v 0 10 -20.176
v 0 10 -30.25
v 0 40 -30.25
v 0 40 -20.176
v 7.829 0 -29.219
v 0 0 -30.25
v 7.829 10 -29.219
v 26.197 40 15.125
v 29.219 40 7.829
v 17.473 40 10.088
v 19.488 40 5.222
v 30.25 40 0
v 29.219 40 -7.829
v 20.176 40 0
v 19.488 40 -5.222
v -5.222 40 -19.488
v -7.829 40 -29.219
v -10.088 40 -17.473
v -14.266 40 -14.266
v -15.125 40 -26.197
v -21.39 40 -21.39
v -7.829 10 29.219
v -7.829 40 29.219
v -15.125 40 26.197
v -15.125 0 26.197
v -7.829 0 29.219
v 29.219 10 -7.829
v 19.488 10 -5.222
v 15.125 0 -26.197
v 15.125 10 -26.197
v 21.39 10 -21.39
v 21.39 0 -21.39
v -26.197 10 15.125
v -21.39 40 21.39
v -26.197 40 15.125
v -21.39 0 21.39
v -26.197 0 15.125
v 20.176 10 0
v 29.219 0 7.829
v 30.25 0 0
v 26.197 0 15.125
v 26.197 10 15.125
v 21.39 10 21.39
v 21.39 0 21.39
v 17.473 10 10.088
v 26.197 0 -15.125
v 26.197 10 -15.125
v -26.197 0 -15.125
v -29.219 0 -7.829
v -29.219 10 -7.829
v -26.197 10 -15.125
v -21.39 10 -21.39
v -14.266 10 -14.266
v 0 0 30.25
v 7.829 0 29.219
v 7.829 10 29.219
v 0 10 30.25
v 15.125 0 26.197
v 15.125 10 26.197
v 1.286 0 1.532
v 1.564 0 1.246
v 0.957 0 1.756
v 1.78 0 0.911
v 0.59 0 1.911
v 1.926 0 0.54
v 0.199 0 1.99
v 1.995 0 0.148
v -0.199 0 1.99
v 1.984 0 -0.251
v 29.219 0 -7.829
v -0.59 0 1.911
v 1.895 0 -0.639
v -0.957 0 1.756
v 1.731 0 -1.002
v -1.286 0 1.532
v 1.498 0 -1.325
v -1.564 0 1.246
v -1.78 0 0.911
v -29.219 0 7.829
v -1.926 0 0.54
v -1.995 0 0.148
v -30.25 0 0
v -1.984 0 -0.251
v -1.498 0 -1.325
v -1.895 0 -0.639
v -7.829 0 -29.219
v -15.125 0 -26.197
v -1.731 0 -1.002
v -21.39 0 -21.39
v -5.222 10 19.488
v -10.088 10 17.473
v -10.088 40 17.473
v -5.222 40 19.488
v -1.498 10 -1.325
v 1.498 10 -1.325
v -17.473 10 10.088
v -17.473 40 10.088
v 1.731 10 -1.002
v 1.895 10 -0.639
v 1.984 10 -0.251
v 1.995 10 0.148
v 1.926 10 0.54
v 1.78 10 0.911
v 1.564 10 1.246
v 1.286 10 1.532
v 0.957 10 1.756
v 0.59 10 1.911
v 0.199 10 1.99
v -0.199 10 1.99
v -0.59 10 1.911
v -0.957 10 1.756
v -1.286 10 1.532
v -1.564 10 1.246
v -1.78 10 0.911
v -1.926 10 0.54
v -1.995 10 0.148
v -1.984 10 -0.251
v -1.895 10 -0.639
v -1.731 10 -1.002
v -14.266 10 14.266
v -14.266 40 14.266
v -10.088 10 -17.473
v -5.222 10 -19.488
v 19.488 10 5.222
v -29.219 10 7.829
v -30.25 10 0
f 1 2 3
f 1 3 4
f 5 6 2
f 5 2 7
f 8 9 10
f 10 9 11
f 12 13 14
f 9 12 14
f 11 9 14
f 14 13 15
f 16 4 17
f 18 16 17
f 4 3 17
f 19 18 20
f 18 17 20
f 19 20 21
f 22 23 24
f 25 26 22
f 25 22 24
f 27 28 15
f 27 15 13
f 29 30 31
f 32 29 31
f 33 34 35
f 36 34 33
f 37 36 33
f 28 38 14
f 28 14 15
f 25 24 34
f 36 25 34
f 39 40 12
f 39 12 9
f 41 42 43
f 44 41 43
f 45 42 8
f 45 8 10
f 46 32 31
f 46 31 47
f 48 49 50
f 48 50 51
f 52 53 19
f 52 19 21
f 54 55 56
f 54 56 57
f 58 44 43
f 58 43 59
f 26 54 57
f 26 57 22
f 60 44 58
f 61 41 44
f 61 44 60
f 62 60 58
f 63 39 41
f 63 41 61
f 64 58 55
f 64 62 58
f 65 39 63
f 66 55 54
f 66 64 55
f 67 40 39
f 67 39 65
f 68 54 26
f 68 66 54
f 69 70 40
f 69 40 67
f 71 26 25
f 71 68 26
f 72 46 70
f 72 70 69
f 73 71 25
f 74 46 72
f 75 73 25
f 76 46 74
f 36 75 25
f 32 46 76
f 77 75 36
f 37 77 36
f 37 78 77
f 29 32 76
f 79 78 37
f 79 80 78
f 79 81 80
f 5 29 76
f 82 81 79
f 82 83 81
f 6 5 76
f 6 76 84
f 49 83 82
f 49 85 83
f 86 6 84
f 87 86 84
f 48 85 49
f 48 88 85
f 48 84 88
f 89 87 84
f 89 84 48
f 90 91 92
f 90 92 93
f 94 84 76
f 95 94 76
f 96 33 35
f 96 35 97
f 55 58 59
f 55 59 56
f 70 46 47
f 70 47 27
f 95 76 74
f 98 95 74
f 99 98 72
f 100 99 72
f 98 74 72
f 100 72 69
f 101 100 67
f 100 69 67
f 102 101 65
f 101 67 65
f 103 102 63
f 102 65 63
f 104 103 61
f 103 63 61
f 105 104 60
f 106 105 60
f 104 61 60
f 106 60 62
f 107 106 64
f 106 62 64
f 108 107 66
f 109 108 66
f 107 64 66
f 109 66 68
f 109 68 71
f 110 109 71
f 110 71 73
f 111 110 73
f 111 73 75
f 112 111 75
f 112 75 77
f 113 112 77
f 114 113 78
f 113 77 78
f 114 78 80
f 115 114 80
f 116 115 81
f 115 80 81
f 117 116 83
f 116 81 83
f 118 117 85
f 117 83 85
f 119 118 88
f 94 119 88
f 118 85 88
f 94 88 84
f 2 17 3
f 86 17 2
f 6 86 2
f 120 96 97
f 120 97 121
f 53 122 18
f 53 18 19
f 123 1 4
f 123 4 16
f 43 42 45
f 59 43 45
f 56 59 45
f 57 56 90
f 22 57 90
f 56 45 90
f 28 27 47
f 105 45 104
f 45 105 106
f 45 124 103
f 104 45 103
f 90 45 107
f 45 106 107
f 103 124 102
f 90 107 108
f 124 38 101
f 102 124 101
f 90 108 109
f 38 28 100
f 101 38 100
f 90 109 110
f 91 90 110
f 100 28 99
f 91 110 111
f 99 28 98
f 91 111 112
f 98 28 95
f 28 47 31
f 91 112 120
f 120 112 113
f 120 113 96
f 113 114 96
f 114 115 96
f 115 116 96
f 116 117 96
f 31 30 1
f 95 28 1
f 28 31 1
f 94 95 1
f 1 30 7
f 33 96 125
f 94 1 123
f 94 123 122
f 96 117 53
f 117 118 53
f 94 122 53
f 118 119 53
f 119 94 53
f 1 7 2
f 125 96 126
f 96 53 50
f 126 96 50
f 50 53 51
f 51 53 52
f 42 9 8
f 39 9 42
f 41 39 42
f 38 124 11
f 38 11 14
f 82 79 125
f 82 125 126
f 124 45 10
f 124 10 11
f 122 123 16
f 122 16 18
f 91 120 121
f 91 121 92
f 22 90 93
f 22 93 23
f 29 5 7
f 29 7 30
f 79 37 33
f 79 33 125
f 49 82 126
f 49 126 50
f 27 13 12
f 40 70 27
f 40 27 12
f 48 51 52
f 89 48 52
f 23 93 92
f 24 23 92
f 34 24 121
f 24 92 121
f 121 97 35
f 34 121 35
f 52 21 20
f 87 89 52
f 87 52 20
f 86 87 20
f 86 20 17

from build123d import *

# Parameters (mm, degrees)
BOSS_EXTRUDE2_DEPTH = 10
BOSS_EXTRUDE3_DEPTH = 40
BOSS_EXTRUDE4_DEPTH = 10


with BuildPart() as part:
    # Sketch1 → Boss-Extrude2 (new body)
    with BuildSketch(Plane(origin=(0, 0, 0), x_dir=(1, 0, 0), z_dir=(0, 1, 0))):
        Polygon((-10.087889227, 17.472736683), (-14.266429761, 14.266429761), (-17.472736683, 10.087889227), (-19.488305475, 5.221875714), (-20.175778455, 0), (-19.488305475, -5.221875714), (-17.472736683, -10.087889227), (-14.266429761, -14.266429761), (-10.087889227, -17.472736683), (-5.221875714, -19.488305475), (0, -20.175778455), (5.221875714, -19.488305475), (10.087889227, -17.472736683), (14.266429761, -14.266429761), (17.472736683, -10.087889227), (19.488305475, -5.221875714), (20.175778455, 0), (19.488305475, 5.221875714), (17.472736683, 10.087889227), (14.266429761, 14.266429761), (10.087889227, 17.472736683), (5.221875714, 19.488305475), (0, 20.175778455), (-5.221875714, 19.488305475), align=None)
        with BuildLine():
            Line((-1.497847768, 1.325312063), (1.497847768, 1.325312063))
            ThreePointArc((1.497847768, 1.325312063), (0, -2), (-1.497847768, 1.325312063))
        make_face(mode=Mode.SUBTRACT)
    extrude(amount=BOSS_EXTRUDE2_DEPTH)

    # Sketch1<5> → Boss-Extrude3 (add)
    with BuildSketch(Plane(origin=(0, 0, 0), x_dir=(1, 0, 0), z_dir=(0, 1, 0))):
        Polygon((-21.389762566, 21.389762566), (-14.266429761, 14.266429761), (-10.087889227, 17.472736683), (-5.221875714, 19.488305475), (0, 20.175778455), (0, 30.249692317), (-7.82919648, 29.218959046), (-15.124846159, 26.197002003), align=None)
        Polygon((-14.266429761, -14.266429761), (-17.472736683, -10.087889227), (-26.197002003, -15.124846159), (-21.389762566, -21.389762566), (-15.124846159, -26.197002003), (-7.82919648, -29.218959046), (-5.221875714, -19.488305475), (-10.087889227, -17.472736683), align=None)
        Polygon((29.218959046, 7.82919648), (19.488305475, 5.221875714), (20.175778455, 0), (19.488305475, -5.221875714), (17.472736683, -10.087889227), (26.197002003, -15.124846159), (29.218959046, -7.82919648), (30.249692317, 0), align=None)
    extrude(amount=BOSS_EXTRUDE3_DEPTH)

    # Sketch1<7> → Boss-Extrude4 (add)
    with BuildSketch(Plane(origin=(0, 0, 0), x_dir=(1, 0, 0), z_dir=(0, 1, 0))):
        Polygon((-17.472736683, 10.087889227), (-14.266429761, 14.266429761), (-21.389762566, 21.389762566), (-26.197002003, 15.124846159), (-29.218959046, 7.82919648), (-30.249692317, 0), (-29.218959046, -7.82919648), (-26.197002003, -15.124846159), (-17.472736683, -10.087889227), (-19.488305475, -5.221875714), (-20.175778455, 0), (-19.488305475, 5.221875714), align=None)
        Polygon((0, 30.249692317), (0, 20.175778455), (5.221875714, 19.488305475), (10.087889227, 17.472736683), (14.266429761, 14.266429761), (17.472736683, 10.087889227), (19.488305475, 5.221875714), (29.218959046, 7.82919648), (26.197002003, 15.124846159), (21.389762566, 21.389762566), (15.124846159, 26.197002003), (7.82919648, 29.218959046), align=None)
        Polygon((0, -20.175778455), (-5.221875714, -19.488305475), (-7.82919648, -29.218959046), (0, -30.249692317), (7.82919648, -29.218959046), (15.124846159, -26.197002003), (21.389762566, -21.389762566), (26.197002003, -15.124846159), (17.472736683, -10.087889227), (14.266429761, -14.266429761), (10.087889227, -17.472736683), (5.221875714, -19.488305475), align=None)
    extrude(amount=BOSS_EXTRUDE4_DEPTH)


solid = part.part
